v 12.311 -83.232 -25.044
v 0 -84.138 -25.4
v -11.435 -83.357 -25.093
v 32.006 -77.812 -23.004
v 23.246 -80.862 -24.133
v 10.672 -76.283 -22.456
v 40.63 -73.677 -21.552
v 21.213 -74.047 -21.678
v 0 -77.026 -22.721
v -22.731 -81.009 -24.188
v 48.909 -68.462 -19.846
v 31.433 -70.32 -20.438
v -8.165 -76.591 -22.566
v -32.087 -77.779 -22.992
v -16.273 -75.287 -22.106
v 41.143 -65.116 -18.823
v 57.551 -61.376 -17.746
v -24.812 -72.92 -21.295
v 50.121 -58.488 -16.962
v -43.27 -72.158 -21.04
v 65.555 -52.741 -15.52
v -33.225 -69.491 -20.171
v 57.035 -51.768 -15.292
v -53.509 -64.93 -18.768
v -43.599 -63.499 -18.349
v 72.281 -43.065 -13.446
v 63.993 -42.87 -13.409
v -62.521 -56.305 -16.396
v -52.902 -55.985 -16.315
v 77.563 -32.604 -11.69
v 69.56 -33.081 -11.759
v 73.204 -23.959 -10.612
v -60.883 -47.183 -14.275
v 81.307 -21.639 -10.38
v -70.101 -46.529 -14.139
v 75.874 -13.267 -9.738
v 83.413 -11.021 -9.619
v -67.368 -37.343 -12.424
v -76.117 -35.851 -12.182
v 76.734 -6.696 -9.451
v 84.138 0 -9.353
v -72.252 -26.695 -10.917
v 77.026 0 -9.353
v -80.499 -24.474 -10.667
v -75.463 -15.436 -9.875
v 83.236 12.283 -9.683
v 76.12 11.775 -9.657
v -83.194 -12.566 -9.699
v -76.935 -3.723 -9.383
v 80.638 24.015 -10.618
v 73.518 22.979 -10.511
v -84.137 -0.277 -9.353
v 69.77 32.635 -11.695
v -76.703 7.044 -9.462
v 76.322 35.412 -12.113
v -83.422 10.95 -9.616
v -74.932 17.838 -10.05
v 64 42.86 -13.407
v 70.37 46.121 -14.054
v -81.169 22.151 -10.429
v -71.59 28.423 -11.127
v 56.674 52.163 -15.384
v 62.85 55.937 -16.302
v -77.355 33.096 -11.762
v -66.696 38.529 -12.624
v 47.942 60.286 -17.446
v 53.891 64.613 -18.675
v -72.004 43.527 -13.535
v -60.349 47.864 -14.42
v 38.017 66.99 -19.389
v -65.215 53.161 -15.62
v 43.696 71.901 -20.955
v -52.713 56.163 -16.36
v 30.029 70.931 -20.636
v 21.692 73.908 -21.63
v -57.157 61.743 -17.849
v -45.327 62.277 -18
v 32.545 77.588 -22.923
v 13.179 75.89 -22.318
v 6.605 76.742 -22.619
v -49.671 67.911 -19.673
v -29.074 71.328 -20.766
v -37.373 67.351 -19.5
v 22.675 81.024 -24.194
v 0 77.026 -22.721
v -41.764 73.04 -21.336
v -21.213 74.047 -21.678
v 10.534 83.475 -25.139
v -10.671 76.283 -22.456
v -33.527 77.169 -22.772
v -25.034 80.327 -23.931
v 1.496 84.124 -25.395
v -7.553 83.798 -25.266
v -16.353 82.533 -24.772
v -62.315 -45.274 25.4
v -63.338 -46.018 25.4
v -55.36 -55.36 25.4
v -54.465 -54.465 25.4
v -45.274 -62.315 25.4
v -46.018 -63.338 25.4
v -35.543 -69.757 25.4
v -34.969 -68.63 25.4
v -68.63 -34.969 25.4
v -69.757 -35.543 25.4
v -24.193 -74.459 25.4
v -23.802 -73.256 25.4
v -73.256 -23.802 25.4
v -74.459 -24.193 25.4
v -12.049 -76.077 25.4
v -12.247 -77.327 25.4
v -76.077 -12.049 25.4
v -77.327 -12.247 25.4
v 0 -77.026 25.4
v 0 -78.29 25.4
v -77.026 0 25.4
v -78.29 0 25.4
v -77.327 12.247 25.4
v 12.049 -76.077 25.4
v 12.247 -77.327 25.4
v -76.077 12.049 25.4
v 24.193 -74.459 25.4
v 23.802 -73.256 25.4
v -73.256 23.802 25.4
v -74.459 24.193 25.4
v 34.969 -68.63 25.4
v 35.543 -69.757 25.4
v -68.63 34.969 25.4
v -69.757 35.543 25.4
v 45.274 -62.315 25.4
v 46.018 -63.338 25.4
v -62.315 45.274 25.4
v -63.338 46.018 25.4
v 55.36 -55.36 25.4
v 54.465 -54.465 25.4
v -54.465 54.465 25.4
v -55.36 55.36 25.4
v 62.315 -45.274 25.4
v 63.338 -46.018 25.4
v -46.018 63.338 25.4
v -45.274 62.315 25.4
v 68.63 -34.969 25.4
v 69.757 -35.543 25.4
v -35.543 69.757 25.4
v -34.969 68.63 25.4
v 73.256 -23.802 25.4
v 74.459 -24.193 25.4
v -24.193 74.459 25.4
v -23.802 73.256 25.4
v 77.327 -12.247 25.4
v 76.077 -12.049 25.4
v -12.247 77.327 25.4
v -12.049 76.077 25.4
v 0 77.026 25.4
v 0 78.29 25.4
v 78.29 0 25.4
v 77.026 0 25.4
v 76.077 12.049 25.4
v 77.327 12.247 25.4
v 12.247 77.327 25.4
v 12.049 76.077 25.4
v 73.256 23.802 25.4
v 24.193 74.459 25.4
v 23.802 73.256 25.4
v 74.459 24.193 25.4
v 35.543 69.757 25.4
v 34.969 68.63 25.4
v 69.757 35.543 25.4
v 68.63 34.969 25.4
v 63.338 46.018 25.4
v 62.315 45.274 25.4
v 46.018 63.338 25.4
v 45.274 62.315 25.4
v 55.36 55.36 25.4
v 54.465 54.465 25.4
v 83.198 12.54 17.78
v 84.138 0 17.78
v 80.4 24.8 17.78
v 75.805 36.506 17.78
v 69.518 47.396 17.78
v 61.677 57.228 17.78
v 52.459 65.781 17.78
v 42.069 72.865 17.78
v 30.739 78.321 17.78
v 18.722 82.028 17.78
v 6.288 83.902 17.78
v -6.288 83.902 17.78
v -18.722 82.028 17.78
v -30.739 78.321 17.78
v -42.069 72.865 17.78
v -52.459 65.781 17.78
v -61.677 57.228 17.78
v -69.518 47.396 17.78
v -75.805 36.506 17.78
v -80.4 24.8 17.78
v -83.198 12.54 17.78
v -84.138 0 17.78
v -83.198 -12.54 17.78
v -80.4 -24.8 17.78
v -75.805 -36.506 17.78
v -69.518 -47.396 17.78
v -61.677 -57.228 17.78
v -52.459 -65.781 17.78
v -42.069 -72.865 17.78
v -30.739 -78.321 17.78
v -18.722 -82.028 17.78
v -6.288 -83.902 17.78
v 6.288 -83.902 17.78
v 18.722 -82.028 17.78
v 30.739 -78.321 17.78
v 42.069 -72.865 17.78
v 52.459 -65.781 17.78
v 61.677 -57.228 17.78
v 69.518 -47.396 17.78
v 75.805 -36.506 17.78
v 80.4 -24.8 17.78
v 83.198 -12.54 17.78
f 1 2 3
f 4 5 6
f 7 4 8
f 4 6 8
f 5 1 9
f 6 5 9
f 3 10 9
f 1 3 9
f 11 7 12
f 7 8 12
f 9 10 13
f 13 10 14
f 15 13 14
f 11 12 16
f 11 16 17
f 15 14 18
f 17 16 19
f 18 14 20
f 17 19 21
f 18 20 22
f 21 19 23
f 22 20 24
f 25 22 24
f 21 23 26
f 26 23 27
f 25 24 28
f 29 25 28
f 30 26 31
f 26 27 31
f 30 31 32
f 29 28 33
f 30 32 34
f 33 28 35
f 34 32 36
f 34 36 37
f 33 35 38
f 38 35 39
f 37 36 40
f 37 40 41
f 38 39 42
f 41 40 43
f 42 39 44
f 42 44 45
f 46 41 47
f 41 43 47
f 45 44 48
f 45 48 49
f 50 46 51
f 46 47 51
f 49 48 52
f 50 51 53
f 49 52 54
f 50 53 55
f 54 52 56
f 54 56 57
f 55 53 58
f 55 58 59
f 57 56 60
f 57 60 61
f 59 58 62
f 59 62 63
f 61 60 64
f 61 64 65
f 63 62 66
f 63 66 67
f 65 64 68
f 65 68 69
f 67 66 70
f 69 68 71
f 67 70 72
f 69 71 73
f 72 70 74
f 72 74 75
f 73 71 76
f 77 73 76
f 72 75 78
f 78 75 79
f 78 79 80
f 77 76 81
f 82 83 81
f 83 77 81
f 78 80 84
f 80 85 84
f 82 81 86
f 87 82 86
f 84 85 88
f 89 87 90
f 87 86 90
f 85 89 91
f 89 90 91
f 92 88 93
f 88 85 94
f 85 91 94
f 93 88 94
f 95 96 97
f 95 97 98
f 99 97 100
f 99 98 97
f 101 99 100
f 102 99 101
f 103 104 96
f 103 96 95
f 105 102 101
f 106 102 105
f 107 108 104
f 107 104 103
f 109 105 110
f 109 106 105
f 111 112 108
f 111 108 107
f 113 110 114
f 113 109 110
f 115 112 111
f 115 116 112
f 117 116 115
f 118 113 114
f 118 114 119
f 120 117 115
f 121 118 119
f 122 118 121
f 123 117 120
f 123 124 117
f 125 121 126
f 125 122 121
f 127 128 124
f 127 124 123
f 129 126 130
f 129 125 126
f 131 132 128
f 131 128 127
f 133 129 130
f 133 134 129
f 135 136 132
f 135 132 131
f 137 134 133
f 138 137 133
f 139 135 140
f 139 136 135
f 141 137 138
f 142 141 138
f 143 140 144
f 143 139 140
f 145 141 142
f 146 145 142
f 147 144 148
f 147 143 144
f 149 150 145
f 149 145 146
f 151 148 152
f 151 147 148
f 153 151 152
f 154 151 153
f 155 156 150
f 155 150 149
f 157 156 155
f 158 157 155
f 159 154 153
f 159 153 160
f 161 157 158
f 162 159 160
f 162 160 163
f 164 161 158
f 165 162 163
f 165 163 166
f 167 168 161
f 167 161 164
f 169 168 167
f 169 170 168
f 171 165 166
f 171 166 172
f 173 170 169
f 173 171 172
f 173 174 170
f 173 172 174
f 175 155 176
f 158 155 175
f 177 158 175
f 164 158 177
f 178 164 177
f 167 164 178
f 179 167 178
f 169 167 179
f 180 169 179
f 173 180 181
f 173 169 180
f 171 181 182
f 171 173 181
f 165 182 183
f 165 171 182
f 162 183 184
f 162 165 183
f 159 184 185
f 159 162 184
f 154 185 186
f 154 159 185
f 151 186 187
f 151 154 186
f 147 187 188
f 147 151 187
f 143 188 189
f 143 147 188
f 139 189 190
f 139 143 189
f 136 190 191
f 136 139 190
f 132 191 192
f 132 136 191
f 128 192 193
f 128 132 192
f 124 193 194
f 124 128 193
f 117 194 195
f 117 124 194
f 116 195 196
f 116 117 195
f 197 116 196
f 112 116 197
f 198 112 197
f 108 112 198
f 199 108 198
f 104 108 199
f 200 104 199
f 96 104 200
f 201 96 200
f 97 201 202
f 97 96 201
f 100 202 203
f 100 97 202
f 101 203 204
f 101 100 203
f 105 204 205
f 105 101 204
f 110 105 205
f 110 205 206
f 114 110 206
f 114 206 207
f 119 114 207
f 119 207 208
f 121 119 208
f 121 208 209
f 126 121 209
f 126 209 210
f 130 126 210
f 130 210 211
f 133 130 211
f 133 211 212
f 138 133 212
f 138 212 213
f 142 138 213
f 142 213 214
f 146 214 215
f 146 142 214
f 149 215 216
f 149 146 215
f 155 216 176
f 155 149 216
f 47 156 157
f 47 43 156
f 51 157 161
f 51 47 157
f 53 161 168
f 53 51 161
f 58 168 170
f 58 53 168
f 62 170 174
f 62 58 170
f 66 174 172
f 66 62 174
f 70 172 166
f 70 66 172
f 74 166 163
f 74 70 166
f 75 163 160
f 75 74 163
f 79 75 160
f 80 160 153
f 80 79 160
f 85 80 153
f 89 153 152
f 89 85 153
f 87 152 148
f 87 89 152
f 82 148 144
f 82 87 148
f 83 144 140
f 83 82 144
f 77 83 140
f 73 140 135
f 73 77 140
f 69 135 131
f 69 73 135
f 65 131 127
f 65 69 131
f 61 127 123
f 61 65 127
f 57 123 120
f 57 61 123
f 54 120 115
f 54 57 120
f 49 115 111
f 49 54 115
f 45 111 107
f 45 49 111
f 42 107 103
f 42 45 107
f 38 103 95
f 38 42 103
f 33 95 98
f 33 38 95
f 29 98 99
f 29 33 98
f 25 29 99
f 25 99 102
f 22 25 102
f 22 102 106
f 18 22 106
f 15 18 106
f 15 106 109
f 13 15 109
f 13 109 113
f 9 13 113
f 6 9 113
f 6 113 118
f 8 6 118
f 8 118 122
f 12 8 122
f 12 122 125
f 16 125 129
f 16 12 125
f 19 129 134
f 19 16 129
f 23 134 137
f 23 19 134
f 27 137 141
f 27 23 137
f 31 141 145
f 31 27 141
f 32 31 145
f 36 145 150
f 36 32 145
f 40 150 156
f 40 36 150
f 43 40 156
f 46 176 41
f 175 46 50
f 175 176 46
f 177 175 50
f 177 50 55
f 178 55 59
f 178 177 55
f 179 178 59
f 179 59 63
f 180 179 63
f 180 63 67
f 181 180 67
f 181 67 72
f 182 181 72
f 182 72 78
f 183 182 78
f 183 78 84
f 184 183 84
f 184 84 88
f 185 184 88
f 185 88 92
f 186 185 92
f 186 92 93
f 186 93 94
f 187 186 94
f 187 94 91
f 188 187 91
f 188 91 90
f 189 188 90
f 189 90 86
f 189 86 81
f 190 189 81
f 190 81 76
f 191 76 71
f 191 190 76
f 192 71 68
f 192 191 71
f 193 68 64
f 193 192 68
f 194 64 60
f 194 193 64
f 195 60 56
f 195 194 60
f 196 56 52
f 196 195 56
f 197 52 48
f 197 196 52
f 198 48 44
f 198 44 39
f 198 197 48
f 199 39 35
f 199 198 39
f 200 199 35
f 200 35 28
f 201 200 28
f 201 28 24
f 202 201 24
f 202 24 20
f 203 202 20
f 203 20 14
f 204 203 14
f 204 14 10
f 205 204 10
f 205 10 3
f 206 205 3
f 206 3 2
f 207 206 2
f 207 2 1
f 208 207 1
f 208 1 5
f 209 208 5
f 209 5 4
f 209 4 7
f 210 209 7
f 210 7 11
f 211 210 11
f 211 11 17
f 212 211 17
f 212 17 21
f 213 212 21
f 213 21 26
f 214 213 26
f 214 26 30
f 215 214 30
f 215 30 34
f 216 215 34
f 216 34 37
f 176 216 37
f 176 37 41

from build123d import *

# Parameters (mm, degrees)
SKETCH1_R               = 84.1375
SKETCH1_R_2             = 77.0255
EXTRUDE1_DEPTH          = 25.4
CHAMFER1_SIZE           = 7.62
CHAMFER1_SIZE2          = 5.847031648
CUT_EXTRUDE1_DEPTH      = 122.669214728
CUT_EXTRUDE2_DEPTH      = 122.669214887
CUT_EXTRUDE2_DEPTH_BACK = 122.669214887


with BuildPart() as part:
    # Sketch1 → Extrude1 (new, symmetric)
    with BuildSketch(Plane.XY):
        Circle(SKETCH1_R)
        Circle(SKETCH1_R_2, mode=Mode.SUBTRACT)
    extrude(amount=EXTRUDE1_DEPTH, both=True)

    # Chamfer1
    chamfer1_edges = [part.edges().sort_by_distance(p)[0] for p in [
        (-84.1375, 0, 25.4),
    ]]
    chamfer1_side = [part.faces().sort_by_distance(p)[0] for p in [
        (-84.1375, 0, 0),
    ]]
    chamfer(chamfer1_edges, length=CHAMFER1_SIZE, length2=CHAMFER1_SIZE2, reference=chamfer1_side[0])

    # Sketch2 → Cut-Extrude1 (cut, through all)
    with BuildSketch(Plane(origin=(0, 0, 0), x_dir=(0, 0, -1), z_dir=(1, 0, 0))):
        with BuildLine():
            Line((25.4, 84.1375), (25.4, -84.1375))
            ThreePointArc((25.4, -84.1375), (9.353148868, 0), (25.4, 84.1375))
        make_face()
    extrude(amount=-CUT_EXTRUDE1_DEPTH, mode=Mode.SUBTRACT)

    # Sketch2<2> → Cut-Extrude2 (cut, two sides: drawn at the far end of the back side and taken through both)
    with BuildSketch(Plane(origin=(0, 0, 0), x_dir=(0, 0, -1), z_dir=(1, 0, 0)).offset(-CUT_EXTRUDE2_DEPTH_BACK)):
        with BuildLine():
            Line((25.4, 84.1375), (25.4, -84.1375))
            ThreePointArc((25.4, -84.1375), (9.353148868, 0), (25.4, 84.1375))
        make_face()
    extrude(amount=CUT_EXTRUDE2_DEPTH + CUT_EXTRUDE2_DEPTH_BACK, mode=Mode.SUBTRACT)


solid = part.part
